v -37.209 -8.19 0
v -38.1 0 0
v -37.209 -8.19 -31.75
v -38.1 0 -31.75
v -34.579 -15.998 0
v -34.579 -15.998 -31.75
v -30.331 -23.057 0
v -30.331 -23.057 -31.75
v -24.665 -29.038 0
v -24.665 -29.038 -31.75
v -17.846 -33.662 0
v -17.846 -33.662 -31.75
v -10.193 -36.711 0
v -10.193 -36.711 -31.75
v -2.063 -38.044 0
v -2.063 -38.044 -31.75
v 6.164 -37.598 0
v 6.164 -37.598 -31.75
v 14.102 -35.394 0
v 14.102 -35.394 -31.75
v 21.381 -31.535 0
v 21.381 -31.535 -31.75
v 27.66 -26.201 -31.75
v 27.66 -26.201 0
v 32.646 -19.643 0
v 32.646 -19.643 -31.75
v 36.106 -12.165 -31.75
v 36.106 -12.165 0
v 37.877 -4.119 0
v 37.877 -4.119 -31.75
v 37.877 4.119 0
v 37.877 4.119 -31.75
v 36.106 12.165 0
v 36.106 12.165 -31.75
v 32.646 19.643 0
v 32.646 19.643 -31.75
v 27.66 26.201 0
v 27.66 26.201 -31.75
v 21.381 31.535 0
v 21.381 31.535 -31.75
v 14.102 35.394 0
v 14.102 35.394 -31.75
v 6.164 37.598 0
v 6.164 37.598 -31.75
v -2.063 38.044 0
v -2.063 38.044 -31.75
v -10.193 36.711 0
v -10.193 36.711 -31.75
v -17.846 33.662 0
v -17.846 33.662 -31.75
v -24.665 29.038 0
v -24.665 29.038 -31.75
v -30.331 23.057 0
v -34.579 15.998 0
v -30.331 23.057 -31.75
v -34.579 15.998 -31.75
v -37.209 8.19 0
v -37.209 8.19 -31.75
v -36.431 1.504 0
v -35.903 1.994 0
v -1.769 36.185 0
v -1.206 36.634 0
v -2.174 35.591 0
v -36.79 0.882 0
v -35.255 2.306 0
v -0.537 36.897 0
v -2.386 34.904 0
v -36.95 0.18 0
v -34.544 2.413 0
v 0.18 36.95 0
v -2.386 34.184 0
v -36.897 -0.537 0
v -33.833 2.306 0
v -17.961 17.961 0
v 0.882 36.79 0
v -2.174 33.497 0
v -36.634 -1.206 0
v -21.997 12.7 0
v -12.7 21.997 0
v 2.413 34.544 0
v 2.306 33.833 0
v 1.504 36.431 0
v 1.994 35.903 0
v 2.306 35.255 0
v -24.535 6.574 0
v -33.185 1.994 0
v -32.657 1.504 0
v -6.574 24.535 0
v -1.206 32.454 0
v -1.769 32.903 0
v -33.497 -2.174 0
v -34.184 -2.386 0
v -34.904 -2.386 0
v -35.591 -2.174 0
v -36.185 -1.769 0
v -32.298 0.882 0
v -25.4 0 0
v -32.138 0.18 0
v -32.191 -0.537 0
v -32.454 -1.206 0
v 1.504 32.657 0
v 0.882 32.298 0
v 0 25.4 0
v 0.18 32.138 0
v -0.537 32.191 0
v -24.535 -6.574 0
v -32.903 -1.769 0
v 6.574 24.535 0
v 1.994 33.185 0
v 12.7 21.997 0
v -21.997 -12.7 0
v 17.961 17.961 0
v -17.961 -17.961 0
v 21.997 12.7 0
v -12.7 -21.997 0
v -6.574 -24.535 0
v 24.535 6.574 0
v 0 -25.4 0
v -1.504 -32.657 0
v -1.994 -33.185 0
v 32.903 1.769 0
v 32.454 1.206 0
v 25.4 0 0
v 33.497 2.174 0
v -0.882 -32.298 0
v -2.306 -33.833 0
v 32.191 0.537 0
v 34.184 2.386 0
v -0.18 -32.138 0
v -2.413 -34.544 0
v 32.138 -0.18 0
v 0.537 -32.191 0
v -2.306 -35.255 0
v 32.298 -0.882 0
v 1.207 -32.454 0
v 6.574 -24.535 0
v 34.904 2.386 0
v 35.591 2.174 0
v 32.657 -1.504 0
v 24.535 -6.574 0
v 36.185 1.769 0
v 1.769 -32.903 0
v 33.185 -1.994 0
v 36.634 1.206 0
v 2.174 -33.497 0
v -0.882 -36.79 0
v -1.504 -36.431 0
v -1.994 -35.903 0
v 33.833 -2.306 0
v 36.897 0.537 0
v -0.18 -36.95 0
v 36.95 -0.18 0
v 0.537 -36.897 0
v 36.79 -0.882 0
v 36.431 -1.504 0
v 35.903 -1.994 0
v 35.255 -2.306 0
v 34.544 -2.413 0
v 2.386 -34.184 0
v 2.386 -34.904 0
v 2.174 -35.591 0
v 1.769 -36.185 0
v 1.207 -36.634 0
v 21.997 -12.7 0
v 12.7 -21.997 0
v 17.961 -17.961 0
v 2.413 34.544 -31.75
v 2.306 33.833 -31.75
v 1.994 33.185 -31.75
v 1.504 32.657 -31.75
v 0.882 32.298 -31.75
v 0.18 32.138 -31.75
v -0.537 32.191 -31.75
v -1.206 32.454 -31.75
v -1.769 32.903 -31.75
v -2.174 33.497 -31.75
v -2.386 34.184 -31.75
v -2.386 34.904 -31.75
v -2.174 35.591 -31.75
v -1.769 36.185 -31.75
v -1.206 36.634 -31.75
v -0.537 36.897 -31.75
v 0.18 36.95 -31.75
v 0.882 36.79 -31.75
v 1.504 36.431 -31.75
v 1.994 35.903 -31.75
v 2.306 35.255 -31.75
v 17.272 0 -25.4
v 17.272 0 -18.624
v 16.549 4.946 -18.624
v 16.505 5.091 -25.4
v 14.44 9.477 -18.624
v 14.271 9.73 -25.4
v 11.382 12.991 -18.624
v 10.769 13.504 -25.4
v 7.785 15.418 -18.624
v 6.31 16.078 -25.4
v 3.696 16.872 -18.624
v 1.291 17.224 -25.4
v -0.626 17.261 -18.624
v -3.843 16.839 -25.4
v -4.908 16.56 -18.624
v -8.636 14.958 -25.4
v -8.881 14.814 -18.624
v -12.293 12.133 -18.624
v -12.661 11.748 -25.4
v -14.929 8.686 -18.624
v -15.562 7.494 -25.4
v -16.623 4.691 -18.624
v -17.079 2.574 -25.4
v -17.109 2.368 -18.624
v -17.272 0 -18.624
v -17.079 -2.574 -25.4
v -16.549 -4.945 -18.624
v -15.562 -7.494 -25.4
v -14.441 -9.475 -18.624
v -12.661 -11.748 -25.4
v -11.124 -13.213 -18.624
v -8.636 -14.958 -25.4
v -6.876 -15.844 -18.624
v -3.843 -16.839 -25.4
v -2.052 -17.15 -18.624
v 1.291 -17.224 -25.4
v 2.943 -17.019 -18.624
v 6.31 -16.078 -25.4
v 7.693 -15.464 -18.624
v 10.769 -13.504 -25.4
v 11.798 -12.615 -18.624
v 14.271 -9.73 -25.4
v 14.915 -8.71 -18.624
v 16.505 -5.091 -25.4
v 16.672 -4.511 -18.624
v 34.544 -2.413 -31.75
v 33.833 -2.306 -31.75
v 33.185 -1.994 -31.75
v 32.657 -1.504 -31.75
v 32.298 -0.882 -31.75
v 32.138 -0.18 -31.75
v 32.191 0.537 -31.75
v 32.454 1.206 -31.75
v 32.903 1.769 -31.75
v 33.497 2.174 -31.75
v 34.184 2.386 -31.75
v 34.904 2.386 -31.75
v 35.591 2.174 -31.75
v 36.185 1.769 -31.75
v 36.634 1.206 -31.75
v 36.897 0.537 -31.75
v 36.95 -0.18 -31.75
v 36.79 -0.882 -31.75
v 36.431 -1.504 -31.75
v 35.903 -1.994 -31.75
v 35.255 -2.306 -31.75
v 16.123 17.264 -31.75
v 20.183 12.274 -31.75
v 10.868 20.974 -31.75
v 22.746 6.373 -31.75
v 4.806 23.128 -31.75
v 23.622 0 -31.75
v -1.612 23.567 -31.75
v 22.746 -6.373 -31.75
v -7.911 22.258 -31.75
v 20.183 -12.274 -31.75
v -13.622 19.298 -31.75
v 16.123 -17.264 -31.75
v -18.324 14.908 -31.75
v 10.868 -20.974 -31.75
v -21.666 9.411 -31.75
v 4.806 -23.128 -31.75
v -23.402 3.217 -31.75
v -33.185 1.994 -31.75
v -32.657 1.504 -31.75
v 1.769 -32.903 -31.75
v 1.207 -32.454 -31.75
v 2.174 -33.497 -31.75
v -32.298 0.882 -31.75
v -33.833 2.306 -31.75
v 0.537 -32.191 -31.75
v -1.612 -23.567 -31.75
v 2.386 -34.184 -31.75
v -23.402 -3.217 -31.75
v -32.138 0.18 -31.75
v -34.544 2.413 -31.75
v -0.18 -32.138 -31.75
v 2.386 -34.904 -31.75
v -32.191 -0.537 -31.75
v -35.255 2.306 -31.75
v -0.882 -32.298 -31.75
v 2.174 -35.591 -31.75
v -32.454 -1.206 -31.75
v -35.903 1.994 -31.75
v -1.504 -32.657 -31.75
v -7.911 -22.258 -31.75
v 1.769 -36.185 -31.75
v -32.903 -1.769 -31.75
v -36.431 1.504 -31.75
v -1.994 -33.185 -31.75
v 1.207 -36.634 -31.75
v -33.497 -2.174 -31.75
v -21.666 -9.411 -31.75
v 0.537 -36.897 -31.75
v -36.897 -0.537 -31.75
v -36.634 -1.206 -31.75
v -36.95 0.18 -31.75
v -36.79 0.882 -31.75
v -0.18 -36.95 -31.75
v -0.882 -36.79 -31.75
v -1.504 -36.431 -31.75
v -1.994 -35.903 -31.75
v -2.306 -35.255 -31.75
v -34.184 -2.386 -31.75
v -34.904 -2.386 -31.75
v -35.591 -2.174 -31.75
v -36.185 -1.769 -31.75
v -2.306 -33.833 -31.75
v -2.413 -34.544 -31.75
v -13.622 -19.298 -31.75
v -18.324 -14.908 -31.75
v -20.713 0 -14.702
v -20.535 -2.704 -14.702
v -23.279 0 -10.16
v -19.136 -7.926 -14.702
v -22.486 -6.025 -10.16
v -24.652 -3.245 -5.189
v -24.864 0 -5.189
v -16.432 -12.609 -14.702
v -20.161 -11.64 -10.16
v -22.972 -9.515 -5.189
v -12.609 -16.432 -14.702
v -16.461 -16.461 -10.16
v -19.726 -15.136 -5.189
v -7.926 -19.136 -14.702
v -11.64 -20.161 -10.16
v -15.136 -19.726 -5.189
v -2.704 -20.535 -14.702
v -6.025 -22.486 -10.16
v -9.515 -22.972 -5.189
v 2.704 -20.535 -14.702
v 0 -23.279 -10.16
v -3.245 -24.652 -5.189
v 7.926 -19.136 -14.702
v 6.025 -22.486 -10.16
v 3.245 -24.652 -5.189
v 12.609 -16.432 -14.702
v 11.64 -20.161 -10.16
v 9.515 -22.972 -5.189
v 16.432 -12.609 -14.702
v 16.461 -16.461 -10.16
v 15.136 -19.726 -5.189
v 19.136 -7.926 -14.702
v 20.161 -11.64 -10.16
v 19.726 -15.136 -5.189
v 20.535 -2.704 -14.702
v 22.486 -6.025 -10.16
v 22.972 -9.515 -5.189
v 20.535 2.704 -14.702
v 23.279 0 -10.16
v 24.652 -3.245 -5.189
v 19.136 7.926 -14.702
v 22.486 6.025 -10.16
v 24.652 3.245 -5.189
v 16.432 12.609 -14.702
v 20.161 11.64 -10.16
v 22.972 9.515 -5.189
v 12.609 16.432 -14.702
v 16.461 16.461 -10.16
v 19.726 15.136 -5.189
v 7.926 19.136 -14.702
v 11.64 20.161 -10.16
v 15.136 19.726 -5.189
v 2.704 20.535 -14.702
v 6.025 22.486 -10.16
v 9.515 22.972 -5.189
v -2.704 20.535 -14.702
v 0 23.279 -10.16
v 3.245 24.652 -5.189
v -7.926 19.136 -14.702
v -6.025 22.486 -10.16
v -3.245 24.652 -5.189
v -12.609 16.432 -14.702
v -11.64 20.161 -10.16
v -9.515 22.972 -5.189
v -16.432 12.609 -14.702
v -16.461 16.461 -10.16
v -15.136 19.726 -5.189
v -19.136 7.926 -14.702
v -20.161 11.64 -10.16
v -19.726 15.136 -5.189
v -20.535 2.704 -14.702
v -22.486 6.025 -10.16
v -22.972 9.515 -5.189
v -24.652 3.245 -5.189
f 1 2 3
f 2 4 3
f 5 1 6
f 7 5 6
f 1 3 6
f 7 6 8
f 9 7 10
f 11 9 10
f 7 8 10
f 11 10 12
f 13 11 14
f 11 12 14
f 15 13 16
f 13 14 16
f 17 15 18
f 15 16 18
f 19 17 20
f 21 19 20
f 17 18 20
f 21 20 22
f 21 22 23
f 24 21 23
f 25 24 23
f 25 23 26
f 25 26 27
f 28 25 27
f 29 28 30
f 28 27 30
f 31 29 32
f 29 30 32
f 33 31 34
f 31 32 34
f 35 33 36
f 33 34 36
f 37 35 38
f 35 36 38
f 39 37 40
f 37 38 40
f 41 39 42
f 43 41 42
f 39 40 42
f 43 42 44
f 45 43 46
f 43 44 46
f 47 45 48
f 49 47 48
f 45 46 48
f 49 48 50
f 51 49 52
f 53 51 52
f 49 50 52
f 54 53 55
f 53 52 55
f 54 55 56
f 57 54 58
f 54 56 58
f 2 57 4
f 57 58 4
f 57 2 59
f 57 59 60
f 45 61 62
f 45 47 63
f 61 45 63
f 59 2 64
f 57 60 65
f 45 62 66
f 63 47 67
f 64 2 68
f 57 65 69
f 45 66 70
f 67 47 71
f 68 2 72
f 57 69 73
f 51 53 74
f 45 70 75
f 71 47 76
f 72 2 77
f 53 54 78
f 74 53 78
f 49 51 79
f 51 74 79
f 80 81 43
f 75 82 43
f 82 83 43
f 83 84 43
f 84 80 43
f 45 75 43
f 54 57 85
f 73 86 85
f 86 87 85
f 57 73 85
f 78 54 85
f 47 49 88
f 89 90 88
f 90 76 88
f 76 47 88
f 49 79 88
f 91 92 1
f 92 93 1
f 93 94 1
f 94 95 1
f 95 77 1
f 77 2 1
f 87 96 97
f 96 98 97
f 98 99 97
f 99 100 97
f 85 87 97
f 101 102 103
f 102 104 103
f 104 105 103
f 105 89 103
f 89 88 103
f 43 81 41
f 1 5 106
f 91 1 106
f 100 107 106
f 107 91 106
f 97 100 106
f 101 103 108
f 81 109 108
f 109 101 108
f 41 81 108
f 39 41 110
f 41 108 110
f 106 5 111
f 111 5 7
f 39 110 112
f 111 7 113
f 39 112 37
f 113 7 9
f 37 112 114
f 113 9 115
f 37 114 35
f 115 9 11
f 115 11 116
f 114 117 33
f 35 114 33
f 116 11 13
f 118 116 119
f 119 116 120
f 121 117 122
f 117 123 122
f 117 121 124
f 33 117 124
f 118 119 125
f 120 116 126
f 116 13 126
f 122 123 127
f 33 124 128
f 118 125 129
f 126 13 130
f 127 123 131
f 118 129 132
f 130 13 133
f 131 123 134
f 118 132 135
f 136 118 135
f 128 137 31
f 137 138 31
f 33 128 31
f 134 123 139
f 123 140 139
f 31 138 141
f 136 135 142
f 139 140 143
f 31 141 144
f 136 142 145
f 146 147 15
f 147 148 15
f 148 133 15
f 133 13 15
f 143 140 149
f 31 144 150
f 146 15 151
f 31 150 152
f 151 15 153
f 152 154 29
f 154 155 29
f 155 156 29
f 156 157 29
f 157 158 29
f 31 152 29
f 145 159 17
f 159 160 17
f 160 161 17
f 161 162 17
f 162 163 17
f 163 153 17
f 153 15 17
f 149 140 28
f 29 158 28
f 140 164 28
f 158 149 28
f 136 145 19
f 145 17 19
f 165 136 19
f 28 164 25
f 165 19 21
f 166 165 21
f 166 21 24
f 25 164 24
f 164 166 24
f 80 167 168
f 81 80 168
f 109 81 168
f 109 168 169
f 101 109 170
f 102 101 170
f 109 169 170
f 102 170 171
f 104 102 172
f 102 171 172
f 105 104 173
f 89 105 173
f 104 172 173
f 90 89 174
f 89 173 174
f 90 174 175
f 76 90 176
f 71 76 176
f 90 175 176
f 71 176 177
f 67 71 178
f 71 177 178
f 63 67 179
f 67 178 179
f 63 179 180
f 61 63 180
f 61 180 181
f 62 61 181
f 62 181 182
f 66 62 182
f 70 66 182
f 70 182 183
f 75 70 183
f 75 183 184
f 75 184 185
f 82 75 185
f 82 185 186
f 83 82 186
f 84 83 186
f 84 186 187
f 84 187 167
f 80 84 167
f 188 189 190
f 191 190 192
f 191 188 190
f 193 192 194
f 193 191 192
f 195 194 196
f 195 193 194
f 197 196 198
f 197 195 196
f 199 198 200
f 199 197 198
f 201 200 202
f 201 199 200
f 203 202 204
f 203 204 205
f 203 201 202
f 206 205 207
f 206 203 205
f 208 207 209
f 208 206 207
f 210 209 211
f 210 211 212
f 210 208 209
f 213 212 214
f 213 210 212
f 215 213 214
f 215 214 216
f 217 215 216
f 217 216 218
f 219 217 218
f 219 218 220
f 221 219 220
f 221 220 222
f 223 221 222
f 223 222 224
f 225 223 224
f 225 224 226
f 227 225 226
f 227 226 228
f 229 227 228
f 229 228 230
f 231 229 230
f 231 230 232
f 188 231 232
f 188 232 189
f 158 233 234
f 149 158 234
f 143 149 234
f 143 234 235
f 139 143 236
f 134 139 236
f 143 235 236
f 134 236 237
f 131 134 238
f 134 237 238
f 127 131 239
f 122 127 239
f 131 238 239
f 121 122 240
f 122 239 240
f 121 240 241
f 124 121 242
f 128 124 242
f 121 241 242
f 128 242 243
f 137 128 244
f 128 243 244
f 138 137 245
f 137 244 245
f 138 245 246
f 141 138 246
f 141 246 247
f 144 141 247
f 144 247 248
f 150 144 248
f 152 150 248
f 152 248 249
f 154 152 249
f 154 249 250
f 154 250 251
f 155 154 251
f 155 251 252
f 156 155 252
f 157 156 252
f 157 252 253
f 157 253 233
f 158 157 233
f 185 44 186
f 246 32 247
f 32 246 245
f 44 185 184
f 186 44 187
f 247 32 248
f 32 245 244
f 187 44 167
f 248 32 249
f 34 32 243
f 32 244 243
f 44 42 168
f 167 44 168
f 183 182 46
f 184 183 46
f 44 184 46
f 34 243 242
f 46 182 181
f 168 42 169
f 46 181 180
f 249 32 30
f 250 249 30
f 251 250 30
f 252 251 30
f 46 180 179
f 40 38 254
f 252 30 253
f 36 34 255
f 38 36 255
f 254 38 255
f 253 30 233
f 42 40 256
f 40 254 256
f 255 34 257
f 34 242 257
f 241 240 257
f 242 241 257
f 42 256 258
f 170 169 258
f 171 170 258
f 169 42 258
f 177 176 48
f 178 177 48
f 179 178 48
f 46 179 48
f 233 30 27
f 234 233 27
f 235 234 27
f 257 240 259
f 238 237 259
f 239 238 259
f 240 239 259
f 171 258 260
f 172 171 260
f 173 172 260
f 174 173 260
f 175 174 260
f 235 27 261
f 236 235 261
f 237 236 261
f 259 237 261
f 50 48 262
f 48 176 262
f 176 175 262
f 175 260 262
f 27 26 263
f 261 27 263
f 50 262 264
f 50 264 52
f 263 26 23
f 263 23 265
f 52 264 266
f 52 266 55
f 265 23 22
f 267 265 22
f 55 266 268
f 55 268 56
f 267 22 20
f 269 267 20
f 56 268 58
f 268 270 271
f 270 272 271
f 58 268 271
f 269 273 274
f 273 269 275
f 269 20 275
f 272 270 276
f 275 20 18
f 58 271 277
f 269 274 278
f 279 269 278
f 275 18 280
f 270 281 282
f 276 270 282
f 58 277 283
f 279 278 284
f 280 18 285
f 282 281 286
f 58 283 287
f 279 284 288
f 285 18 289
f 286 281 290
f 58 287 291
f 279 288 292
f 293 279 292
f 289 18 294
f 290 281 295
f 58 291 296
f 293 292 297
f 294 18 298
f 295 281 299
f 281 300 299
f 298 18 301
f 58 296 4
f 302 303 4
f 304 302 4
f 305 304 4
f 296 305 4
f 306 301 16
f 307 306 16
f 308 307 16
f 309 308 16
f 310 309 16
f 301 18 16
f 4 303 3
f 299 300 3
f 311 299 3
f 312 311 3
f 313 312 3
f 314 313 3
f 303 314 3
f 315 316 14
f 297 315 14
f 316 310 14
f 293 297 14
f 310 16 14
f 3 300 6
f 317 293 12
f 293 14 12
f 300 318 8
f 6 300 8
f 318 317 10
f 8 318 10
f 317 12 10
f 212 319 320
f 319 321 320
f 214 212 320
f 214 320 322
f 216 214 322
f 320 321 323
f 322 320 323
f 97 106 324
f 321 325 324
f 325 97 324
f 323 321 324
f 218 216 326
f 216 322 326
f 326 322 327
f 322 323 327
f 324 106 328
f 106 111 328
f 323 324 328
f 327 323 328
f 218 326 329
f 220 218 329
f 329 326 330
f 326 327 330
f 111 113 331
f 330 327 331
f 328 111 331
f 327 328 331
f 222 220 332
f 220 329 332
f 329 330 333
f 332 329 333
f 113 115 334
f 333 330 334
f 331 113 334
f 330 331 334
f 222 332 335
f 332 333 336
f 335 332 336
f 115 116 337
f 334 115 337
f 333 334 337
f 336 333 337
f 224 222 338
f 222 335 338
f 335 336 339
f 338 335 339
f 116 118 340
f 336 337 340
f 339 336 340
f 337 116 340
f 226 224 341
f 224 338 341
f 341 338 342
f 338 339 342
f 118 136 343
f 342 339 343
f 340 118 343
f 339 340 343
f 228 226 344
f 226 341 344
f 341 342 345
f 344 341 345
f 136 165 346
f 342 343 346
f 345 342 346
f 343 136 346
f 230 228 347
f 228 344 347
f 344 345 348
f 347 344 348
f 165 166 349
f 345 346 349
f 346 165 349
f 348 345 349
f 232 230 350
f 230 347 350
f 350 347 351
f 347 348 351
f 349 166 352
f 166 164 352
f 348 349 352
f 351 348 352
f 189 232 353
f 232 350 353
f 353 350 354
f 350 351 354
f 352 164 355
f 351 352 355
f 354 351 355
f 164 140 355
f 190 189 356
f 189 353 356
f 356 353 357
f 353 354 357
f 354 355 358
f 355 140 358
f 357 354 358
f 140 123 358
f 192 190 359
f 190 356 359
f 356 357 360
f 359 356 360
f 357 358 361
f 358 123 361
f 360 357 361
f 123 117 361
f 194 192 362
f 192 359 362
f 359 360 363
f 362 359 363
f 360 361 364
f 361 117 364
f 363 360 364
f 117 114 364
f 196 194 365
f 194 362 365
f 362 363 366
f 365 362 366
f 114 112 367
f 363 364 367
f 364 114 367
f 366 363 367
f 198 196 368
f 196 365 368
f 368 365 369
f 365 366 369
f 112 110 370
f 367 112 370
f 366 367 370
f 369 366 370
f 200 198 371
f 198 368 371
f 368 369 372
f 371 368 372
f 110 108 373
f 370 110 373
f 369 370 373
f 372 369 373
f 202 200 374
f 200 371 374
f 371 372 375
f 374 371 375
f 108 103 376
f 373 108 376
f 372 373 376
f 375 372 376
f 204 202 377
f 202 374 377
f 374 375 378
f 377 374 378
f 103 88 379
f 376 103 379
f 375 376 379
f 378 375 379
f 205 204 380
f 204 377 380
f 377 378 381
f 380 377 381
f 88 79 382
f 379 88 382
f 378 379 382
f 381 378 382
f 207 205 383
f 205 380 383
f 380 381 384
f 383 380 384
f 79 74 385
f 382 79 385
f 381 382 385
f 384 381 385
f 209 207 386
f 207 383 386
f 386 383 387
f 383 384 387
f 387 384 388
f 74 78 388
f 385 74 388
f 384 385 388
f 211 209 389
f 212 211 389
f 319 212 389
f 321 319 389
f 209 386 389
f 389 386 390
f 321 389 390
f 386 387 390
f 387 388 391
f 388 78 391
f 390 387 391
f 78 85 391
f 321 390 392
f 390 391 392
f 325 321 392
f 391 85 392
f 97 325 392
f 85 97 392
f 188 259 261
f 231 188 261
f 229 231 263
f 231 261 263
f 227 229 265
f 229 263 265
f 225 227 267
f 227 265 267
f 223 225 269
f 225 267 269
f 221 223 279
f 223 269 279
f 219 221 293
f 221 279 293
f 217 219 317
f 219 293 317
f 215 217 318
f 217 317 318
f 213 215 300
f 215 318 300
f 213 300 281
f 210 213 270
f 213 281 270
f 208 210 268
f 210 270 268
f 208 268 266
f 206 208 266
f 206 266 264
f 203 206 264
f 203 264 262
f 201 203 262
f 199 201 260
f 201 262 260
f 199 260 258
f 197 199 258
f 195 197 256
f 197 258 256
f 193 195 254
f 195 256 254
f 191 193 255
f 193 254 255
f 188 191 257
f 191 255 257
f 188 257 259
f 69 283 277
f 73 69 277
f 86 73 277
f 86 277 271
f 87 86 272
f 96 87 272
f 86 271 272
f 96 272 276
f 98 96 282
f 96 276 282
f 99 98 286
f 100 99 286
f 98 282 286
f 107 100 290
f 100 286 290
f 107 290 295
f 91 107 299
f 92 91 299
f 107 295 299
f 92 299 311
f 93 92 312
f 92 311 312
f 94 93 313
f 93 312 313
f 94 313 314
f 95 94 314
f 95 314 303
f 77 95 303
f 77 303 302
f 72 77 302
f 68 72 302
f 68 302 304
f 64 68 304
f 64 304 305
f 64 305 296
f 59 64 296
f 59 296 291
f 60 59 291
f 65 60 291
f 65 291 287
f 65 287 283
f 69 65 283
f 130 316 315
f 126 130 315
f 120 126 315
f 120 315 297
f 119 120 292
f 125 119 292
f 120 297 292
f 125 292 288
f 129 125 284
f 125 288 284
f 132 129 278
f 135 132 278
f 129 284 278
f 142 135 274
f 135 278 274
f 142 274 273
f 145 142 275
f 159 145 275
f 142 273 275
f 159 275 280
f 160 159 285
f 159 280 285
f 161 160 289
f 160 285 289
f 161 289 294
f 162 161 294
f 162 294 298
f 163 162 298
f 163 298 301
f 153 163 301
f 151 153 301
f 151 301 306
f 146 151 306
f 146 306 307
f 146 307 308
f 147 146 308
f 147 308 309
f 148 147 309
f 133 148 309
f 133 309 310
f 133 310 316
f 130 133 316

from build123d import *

# Parameters (mm, degrees)
F3_R            = 17.272
F4_DEPTH        = 25.4
F5_SIZE         = 6.35
F7_D            = 4.826
F7_COPIES_COUNT = 4


# Not quite as in the source:
# - a pattern or mirror of a feature is missing from the dataset's text; its kind, count and spacing are read off the source's solid


with BuildPart() as f1:
    # F0 (on Front) → F1 (revolve)
    with BuildSketch(Plane.XZ):
        with BuildLine():
            ThreePointArc((0, -25.4), (-17.9605122421, -17.9605122421), (-25.4, 0))
            Line((-25.4, 0), (-38.1, 0))
            Line((-38.1, 0), (-38.1, -31.75))
            Line((-38.1, -31.75), (0, -31.75))
            Line((0, -31.75), (0, -25.4))
        make_face()
    revolve(axis=Axis((0, 0, -28.575), (0, 0, 1)))

    # F3 (on offset) → F4 (cut)
    with BuildSketch(Plane.XY.offset(-37.2872)):
        Circle(F3_R)
    extrude(amount=F4_DEPTH, mode=Mode.SUBTRACT)

    # F5
    f5_edges = [f1.edges().sort_by_distance(p)[0] for p in [
        (-17.272, 0, -31.75),
    ]]
    chamfer(f5_edges, length=F5_SIZE)

    # F7 (through all)
    with Locations(Plane.XY):
        with Locations((0, -34.544)):
            f7 = Hole(F7_D / 2)

    # F7_copies: F7 ×4 about axis
    f7_copies_axis = Axis((0, 0, 0), (0, 0, 1))
    for i in range(1, F7_COPIES_COUNT):
        add(f7.rotate(f7_copies_axis, i * 360 / F7_COPIES_COUNT), mode=Mode.SUBTRACT)


solid = f1.part
